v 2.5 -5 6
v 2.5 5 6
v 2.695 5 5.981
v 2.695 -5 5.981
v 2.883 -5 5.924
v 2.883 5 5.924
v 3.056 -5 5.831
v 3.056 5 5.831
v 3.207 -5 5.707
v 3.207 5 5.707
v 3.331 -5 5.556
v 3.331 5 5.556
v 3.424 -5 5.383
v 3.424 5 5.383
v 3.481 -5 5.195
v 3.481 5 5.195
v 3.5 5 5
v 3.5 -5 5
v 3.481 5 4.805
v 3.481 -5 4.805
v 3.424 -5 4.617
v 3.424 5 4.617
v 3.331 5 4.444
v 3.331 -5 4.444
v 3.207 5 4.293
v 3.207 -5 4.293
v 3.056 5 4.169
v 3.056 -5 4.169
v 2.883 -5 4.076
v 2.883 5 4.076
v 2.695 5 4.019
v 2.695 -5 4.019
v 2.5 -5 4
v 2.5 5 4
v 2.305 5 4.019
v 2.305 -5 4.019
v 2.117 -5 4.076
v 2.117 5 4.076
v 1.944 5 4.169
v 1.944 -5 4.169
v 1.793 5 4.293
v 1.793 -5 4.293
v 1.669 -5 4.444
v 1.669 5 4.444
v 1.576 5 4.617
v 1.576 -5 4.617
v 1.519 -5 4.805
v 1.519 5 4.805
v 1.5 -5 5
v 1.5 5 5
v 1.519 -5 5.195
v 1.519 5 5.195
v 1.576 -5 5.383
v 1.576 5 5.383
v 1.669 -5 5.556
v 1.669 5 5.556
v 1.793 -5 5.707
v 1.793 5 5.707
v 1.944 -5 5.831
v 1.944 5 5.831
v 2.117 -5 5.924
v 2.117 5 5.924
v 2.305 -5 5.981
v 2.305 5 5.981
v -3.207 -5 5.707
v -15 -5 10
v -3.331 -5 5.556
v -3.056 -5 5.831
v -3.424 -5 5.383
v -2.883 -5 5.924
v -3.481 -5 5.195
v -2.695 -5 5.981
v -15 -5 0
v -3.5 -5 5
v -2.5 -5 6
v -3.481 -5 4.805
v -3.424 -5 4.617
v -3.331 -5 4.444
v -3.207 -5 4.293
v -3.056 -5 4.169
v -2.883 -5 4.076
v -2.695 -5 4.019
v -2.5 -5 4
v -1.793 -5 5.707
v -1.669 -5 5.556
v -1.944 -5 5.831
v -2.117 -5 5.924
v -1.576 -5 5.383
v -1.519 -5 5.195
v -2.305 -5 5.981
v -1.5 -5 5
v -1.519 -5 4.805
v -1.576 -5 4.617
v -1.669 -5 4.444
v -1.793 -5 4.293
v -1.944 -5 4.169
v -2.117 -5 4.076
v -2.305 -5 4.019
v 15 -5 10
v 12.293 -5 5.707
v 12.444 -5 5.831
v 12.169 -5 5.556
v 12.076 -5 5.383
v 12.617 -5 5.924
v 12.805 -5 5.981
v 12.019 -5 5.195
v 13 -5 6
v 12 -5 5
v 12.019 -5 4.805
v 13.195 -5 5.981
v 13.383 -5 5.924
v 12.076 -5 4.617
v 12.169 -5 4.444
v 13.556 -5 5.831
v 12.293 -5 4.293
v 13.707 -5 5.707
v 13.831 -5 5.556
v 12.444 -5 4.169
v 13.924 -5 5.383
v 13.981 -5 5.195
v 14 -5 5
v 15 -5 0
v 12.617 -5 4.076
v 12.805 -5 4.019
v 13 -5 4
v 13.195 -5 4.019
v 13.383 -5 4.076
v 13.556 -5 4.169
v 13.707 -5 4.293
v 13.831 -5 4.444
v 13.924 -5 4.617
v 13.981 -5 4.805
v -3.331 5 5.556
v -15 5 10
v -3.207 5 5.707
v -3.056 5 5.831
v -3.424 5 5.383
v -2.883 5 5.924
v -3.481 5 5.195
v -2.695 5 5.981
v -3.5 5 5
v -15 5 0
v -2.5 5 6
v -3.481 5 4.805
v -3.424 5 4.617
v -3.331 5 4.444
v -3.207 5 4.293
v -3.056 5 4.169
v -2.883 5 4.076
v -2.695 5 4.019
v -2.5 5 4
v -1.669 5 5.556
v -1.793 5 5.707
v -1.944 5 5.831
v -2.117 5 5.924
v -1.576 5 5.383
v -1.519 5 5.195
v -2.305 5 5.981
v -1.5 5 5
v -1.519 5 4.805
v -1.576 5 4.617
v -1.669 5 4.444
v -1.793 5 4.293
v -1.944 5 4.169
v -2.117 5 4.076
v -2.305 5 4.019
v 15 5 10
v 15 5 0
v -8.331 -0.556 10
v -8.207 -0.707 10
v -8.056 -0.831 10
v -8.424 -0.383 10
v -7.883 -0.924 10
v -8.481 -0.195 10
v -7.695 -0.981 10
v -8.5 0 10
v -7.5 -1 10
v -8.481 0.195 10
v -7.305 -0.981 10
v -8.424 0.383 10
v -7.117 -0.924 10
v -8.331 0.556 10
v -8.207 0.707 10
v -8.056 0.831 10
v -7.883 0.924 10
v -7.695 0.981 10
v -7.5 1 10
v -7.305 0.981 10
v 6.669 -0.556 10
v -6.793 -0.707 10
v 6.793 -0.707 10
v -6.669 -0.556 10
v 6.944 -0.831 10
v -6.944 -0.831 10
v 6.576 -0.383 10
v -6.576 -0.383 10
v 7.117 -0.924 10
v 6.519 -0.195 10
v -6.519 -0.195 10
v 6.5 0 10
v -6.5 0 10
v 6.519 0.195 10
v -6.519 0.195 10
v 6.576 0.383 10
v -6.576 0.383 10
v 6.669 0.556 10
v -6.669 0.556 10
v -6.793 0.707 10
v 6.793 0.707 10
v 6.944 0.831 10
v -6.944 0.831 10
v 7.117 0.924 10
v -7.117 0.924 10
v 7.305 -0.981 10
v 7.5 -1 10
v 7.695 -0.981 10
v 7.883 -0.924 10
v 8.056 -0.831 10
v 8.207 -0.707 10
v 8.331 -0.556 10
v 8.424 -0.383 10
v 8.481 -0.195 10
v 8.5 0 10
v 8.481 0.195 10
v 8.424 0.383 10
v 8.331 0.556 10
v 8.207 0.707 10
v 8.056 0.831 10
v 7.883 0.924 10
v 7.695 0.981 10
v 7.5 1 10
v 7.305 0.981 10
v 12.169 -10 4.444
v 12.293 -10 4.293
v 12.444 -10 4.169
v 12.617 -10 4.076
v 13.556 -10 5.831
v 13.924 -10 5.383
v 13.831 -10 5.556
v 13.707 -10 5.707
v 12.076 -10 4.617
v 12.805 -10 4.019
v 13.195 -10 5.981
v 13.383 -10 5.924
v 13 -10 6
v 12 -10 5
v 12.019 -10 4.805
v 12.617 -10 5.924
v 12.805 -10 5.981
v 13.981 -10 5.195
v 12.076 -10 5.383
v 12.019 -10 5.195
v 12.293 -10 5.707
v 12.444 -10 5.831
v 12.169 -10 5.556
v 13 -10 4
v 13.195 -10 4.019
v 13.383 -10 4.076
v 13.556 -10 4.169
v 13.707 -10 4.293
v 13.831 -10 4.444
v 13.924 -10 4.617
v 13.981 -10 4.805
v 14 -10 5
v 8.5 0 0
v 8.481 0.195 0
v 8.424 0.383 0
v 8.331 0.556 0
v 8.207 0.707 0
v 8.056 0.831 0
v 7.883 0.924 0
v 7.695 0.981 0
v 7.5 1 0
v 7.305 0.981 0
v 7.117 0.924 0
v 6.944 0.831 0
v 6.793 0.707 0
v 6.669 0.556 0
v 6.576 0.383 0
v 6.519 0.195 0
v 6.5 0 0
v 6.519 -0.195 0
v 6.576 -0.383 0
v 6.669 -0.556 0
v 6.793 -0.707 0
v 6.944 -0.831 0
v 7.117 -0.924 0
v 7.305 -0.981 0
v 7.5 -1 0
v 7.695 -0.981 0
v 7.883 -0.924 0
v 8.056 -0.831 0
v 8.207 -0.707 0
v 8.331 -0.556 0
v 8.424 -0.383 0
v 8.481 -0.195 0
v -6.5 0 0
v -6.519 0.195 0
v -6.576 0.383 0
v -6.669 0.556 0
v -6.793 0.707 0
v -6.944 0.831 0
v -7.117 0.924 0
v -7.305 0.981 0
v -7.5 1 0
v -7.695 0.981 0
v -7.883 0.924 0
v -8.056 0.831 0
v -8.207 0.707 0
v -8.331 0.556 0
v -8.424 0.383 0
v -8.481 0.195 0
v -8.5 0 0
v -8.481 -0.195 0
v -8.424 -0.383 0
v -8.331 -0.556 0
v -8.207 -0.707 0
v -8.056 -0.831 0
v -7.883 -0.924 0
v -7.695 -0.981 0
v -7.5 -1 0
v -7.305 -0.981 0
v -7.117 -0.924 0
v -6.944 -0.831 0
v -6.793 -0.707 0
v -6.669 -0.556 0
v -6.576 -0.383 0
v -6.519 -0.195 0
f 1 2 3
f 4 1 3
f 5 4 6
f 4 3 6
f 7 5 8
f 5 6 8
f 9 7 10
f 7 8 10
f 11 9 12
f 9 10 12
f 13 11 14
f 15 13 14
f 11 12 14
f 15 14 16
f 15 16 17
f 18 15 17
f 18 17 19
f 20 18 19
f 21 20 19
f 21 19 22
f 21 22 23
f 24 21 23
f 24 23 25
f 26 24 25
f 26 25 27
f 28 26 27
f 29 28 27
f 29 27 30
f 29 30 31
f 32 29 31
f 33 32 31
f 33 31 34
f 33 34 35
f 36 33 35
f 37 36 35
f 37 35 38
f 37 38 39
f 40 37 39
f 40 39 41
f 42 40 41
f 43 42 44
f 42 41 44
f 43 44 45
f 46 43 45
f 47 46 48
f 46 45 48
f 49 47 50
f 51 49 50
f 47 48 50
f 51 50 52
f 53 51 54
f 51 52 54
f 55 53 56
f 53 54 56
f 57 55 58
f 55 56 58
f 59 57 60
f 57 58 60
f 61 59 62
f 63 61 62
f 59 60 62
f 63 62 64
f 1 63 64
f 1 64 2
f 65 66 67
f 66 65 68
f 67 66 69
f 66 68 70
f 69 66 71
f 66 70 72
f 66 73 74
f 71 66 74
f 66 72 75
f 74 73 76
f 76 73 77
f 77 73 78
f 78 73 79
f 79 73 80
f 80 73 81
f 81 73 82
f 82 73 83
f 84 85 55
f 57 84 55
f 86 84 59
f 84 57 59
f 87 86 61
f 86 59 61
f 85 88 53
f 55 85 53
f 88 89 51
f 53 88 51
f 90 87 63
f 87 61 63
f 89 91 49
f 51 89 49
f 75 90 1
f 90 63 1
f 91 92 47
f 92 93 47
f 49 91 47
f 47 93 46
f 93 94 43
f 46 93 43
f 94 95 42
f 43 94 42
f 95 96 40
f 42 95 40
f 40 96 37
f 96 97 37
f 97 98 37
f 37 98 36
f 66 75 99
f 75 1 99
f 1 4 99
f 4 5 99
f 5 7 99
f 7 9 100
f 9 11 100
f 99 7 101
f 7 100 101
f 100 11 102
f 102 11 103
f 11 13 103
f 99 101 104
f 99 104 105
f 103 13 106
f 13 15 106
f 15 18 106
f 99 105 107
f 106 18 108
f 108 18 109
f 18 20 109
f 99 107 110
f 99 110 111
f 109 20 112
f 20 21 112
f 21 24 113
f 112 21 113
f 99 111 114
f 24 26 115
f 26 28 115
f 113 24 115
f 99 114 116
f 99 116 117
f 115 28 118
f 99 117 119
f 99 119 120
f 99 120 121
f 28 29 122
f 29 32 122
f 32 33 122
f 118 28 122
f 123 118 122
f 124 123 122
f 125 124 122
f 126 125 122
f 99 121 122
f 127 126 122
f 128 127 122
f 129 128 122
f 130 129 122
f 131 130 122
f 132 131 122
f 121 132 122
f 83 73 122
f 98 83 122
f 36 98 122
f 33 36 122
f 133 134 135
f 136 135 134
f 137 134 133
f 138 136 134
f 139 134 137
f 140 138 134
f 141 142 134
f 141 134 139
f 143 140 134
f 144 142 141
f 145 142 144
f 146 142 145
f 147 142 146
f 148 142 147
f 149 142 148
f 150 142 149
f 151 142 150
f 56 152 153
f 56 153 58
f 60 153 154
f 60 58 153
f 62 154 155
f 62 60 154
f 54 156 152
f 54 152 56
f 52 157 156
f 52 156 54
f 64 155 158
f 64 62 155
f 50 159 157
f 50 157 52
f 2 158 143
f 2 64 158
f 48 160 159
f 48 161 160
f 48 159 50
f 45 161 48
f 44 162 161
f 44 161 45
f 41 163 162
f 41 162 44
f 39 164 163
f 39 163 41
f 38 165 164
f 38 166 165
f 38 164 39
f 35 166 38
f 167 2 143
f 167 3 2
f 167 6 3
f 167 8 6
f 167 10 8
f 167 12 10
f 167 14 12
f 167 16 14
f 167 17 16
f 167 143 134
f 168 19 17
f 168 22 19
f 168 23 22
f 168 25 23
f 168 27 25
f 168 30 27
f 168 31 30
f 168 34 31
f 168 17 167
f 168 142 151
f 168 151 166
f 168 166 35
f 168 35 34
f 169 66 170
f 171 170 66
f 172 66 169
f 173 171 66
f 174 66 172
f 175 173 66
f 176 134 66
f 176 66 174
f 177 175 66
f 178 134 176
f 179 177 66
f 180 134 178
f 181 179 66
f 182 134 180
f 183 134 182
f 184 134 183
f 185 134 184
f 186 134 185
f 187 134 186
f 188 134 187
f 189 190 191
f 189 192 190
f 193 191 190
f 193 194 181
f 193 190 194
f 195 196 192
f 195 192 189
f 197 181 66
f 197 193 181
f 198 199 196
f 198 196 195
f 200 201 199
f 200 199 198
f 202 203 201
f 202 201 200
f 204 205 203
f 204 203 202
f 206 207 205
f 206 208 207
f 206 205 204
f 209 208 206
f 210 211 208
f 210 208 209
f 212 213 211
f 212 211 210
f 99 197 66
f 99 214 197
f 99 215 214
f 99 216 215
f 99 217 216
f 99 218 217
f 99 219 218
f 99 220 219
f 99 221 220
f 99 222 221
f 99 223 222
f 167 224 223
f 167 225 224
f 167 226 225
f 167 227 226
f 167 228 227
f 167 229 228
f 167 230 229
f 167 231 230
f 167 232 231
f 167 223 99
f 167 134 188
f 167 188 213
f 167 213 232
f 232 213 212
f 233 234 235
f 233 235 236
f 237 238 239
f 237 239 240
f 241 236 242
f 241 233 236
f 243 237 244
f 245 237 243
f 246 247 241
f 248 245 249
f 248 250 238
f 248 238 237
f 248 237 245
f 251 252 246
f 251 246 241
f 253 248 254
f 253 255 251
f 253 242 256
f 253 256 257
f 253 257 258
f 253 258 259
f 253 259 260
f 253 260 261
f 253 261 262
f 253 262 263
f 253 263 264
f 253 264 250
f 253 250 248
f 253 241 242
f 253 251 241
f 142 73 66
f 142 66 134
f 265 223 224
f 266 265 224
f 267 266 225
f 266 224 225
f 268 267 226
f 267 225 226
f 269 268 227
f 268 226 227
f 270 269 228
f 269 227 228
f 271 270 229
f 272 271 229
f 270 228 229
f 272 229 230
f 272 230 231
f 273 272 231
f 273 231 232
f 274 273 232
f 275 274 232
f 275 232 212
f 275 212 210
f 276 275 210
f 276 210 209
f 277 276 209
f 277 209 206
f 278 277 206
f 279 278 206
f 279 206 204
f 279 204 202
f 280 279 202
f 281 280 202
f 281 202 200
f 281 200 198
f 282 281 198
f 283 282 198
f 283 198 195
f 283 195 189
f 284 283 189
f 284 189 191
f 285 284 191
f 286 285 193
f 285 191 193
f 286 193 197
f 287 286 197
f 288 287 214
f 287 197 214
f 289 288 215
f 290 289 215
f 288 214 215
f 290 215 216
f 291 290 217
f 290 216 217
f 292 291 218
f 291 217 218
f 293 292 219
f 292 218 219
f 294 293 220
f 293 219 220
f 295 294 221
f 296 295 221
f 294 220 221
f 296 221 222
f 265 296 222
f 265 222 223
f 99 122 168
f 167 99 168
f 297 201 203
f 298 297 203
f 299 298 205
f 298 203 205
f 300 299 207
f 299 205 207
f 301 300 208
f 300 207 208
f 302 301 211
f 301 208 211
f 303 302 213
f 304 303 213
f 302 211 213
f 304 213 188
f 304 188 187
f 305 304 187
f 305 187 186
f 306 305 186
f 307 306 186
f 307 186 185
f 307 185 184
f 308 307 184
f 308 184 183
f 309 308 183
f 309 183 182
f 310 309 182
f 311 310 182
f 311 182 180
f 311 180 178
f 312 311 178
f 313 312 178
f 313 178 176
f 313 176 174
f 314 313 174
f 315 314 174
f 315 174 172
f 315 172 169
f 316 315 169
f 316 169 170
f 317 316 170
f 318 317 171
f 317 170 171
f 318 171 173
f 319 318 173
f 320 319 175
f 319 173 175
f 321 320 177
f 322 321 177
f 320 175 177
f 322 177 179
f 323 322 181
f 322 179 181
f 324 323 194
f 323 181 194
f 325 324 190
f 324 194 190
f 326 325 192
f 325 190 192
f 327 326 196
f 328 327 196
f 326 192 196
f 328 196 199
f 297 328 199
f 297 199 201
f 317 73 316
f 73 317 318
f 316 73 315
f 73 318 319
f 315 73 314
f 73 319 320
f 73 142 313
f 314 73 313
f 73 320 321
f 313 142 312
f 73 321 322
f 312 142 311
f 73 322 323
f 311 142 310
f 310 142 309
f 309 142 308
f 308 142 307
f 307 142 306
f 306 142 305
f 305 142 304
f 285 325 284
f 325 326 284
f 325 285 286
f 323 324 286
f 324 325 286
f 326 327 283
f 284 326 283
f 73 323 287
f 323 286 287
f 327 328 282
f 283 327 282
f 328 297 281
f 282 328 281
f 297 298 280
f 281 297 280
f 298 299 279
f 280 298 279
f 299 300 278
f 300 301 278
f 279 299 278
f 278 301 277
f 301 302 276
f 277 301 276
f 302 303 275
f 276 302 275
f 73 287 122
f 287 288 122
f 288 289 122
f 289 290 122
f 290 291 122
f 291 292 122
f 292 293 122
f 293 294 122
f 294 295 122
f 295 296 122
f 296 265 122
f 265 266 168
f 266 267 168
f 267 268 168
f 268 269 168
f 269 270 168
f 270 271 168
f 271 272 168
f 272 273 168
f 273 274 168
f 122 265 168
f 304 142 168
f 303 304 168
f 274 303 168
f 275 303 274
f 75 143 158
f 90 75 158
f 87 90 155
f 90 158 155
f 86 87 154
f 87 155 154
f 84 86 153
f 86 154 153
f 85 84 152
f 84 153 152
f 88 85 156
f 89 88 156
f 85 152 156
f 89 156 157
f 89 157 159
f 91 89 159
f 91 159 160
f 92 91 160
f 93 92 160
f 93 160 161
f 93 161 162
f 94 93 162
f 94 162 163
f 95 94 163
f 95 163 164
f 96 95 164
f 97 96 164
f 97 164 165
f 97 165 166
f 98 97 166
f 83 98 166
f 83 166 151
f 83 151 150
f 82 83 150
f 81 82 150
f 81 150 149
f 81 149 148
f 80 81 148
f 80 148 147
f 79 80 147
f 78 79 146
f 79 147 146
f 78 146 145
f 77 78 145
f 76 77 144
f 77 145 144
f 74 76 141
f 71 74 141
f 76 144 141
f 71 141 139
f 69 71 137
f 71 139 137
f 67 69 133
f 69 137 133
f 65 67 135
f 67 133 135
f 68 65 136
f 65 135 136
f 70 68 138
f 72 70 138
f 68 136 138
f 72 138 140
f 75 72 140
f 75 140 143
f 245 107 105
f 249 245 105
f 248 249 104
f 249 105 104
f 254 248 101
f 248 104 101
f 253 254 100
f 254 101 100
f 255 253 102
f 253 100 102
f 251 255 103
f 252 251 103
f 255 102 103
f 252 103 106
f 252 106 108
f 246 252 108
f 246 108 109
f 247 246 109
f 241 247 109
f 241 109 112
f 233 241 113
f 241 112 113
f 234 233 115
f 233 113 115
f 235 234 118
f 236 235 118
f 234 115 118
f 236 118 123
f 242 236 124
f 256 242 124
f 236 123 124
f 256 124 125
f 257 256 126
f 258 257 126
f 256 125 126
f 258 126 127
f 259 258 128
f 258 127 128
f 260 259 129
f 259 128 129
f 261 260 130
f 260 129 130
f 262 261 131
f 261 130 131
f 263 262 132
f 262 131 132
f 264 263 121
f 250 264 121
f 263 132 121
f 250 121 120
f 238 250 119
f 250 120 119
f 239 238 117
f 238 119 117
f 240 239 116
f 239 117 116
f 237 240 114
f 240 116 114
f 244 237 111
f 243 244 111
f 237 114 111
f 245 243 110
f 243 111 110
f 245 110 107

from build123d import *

# Parameters (mm, degrees)
SKETCH1_W           = 30
SKETCH1_H           = 10
BOSS_EXTRUDE1_DEPTH = 10
SKETCH2_R           = 1
CUT_EXTRUDE1_DEPTH  = 19.708286934
SKETCH4_R           = 1
CUT_EXTRUDE3_DEPTH  = 21.615528128
SKETCH3_R           = 1
BOSS_EXTRUDE2_DEPTH = 5


with BuildPart() as part:
    # Sketch1 → Boss-Extrude1 (new body)
    with BuildSketch(Plane.XY):
        Rectangle(SKETCH1_W, SKETCH1_H)
    extrude(amount=BOSS_EXTRUDE1_DEPTH)

    # Sketch2 → Cut-Extrude1 (cut, through all)
    with BuildSketch(Plane.XY.offset(10)):
        with Locations((-7.5, 0)):
            Circle(SKETCH2_R)
        with Locations((7.5, 0)):
            Circle(SKETCH2_R)
    extrude(amount=-CUT_EXTRUDE1_DEPTH, mode=Mode.SUBTRACT)

    # Sketch4 → Cut-Extrude3 (cut, through all)
    with BuildSketch(Plane(origin=(0, 5, 0), x_dir=(1, 0, 0), z_dir=(0, 1, 0))):
        with Locations(Location((-2.5, -5, 0), (0, 0, 270))):
            Circle(SKETCH4_R)
        with Locations(Location((2.5, -5, 0), (0, 0, 270))):
            Circle(SKETCH4_R)
    extrude(amount=-CUT_EXTRUDE3_DEPTH, mode=Mode.SUBTRACT)

    # Sketch3 → Boss-Extrude2 (add)
    with BuildSketch(Plane.XZ.offset(5)):
        with Locations(Location((13, 5, 0), (0, 0, 90))):
            Circle(SKETCH3_R)
    extrude(amount=BOSS_EXTRUDE2_DEPTH)


solid = part.part
